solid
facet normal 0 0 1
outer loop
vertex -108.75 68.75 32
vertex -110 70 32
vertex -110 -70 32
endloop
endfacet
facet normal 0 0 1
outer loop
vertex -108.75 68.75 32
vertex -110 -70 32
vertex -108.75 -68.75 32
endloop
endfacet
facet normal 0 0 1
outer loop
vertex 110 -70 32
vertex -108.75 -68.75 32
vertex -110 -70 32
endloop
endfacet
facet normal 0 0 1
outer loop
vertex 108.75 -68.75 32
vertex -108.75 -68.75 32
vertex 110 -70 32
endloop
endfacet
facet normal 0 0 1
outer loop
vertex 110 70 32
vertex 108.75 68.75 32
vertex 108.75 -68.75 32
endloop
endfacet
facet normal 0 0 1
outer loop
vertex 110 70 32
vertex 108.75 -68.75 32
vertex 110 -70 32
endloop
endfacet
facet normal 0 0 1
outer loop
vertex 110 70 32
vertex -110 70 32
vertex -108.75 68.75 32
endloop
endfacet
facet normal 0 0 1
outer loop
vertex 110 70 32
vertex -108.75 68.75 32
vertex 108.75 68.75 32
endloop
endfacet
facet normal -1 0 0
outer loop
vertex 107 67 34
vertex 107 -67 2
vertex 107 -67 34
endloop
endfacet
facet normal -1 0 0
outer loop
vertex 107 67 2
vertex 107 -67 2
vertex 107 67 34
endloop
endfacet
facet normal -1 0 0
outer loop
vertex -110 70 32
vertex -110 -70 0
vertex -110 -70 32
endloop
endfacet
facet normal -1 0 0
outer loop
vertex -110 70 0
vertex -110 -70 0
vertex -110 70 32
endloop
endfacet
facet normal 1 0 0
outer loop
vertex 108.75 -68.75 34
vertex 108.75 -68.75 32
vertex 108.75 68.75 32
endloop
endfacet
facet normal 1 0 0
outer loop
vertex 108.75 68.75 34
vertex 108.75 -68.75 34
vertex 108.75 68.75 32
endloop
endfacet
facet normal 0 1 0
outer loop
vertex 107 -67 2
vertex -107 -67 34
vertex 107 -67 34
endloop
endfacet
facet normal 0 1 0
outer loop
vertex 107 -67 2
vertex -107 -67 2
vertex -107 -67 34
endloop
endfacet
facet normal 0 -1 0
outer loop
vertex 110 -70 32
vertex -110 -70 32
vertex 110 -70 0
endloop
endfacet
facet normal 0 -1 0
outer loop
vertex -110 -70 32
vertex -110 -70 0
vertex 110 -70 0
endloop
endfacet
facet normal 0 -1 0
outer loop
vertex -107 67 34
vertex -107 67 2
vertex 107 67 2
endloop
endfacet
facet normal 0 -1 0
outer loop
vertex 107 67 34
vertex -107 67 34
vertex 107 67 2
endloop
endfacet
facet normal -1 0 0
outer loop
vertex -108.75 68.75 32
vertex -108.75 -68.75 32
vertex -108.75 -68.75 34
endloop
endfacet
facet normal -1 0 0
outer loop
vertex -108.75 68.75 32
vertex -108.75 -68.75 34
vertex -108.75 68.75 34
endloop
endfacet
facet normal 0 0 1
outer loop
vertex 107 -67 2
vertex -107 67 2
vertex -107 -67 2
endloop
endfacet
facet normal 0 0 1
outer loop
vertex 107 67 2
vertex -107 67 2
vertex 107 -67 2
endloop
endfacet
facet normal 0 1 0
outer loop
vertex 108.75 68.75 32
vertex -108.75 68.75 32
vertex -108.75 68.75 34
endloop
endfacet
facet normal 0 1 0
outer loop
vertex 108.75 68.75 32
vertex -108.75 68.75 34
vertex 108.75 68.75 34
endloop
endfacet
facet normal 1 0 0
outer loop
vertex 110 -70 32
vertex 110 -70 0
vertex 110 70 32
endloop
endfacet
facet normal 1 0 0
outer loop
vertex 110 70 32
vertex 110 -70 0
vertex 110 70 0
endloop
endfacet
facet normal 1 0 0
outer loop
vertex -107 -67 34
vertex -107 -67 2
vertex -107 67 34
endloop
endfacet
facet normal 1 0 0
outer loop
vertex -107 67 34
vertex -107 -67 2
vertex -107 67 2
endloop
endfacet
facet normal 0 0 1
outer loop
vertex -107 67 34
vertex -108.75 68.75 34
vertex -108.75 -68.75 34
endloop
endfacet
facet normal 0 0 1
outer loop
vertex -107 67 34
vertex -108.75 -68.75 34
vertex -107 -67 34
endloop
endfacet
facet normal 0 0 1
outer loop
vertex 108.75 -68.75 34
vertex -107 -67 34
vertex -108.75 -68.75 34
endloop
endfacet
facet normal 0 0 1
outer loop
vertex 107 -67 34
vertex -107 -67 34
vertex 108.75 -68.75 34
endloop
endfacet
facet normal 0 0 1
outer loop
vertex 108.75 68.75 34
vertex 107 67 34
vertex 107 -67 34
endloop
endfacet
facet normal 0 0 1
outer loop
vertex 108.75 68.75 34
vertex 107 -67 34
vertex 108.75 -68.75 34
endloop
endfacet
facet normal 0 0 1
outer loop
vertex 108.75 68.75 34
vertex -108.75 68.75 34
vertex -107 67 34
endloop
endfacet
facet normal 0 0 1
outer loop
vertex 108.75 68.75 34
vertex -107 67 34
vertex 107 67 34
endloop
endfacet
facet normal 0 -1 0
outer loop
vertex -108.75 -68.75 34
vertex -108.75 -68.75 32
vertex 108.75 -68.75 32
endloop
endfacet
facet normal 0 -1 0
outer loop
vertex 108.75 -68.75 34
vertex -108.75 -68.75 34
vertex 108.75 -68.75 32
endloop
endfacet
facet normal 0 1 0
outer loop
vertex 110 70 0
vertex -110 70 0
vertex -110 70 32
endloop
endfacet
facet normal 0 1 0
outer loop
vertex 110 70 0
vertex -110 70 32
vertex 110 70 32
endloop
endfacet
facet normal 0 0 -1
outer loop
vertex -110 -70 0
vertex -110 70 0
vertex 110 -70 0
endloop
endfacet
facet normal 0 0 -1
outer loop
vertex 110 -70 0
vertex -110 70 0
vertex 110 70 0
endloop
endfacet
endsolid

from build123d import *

# Parameters (mm, degrees)
F0_W     = 220
F0_H     = 140
F1_DEPTH = 2
F2_W     = 220
F2_H     = 140
F2_W_2   = 214
F2_H_2   = 134
F3_DEPTH = 30
F4_W     = 217.5
F4_H     = 137.5
F4_W_2   = 214
F4_H_2   = 134
F5_DEPTH = 2


with BuildPart() as f1:
    # F0 (on Top) → F1 (new body)
    with BuildSketch(Plane.XY):
        Rectangle(F0_W, F0_H)
    extrude(amount=F1_DEPTH)

    # F2 (on face) → F3 (join)
    with BuildSketch(Plane.XY.offset(2)):
        Rectangle(F2_W, F2_H)
        Rectangle(F2_W_2, F2_H_2, mode=Mode.SUBTRACT)
    extrude(amount=F3_DEPTH)

    # F4 (on face) → F5 (join)
    with BuildSketch(Plane.XY.offset(32)):
        Rectangle(F4_W, F4_H)
        Rectangle(F4_W_2, F4_H_2, mode=Mode.SUBTRACT)
    extrude(amount=F5_DEPTH)


solid = f1.part
